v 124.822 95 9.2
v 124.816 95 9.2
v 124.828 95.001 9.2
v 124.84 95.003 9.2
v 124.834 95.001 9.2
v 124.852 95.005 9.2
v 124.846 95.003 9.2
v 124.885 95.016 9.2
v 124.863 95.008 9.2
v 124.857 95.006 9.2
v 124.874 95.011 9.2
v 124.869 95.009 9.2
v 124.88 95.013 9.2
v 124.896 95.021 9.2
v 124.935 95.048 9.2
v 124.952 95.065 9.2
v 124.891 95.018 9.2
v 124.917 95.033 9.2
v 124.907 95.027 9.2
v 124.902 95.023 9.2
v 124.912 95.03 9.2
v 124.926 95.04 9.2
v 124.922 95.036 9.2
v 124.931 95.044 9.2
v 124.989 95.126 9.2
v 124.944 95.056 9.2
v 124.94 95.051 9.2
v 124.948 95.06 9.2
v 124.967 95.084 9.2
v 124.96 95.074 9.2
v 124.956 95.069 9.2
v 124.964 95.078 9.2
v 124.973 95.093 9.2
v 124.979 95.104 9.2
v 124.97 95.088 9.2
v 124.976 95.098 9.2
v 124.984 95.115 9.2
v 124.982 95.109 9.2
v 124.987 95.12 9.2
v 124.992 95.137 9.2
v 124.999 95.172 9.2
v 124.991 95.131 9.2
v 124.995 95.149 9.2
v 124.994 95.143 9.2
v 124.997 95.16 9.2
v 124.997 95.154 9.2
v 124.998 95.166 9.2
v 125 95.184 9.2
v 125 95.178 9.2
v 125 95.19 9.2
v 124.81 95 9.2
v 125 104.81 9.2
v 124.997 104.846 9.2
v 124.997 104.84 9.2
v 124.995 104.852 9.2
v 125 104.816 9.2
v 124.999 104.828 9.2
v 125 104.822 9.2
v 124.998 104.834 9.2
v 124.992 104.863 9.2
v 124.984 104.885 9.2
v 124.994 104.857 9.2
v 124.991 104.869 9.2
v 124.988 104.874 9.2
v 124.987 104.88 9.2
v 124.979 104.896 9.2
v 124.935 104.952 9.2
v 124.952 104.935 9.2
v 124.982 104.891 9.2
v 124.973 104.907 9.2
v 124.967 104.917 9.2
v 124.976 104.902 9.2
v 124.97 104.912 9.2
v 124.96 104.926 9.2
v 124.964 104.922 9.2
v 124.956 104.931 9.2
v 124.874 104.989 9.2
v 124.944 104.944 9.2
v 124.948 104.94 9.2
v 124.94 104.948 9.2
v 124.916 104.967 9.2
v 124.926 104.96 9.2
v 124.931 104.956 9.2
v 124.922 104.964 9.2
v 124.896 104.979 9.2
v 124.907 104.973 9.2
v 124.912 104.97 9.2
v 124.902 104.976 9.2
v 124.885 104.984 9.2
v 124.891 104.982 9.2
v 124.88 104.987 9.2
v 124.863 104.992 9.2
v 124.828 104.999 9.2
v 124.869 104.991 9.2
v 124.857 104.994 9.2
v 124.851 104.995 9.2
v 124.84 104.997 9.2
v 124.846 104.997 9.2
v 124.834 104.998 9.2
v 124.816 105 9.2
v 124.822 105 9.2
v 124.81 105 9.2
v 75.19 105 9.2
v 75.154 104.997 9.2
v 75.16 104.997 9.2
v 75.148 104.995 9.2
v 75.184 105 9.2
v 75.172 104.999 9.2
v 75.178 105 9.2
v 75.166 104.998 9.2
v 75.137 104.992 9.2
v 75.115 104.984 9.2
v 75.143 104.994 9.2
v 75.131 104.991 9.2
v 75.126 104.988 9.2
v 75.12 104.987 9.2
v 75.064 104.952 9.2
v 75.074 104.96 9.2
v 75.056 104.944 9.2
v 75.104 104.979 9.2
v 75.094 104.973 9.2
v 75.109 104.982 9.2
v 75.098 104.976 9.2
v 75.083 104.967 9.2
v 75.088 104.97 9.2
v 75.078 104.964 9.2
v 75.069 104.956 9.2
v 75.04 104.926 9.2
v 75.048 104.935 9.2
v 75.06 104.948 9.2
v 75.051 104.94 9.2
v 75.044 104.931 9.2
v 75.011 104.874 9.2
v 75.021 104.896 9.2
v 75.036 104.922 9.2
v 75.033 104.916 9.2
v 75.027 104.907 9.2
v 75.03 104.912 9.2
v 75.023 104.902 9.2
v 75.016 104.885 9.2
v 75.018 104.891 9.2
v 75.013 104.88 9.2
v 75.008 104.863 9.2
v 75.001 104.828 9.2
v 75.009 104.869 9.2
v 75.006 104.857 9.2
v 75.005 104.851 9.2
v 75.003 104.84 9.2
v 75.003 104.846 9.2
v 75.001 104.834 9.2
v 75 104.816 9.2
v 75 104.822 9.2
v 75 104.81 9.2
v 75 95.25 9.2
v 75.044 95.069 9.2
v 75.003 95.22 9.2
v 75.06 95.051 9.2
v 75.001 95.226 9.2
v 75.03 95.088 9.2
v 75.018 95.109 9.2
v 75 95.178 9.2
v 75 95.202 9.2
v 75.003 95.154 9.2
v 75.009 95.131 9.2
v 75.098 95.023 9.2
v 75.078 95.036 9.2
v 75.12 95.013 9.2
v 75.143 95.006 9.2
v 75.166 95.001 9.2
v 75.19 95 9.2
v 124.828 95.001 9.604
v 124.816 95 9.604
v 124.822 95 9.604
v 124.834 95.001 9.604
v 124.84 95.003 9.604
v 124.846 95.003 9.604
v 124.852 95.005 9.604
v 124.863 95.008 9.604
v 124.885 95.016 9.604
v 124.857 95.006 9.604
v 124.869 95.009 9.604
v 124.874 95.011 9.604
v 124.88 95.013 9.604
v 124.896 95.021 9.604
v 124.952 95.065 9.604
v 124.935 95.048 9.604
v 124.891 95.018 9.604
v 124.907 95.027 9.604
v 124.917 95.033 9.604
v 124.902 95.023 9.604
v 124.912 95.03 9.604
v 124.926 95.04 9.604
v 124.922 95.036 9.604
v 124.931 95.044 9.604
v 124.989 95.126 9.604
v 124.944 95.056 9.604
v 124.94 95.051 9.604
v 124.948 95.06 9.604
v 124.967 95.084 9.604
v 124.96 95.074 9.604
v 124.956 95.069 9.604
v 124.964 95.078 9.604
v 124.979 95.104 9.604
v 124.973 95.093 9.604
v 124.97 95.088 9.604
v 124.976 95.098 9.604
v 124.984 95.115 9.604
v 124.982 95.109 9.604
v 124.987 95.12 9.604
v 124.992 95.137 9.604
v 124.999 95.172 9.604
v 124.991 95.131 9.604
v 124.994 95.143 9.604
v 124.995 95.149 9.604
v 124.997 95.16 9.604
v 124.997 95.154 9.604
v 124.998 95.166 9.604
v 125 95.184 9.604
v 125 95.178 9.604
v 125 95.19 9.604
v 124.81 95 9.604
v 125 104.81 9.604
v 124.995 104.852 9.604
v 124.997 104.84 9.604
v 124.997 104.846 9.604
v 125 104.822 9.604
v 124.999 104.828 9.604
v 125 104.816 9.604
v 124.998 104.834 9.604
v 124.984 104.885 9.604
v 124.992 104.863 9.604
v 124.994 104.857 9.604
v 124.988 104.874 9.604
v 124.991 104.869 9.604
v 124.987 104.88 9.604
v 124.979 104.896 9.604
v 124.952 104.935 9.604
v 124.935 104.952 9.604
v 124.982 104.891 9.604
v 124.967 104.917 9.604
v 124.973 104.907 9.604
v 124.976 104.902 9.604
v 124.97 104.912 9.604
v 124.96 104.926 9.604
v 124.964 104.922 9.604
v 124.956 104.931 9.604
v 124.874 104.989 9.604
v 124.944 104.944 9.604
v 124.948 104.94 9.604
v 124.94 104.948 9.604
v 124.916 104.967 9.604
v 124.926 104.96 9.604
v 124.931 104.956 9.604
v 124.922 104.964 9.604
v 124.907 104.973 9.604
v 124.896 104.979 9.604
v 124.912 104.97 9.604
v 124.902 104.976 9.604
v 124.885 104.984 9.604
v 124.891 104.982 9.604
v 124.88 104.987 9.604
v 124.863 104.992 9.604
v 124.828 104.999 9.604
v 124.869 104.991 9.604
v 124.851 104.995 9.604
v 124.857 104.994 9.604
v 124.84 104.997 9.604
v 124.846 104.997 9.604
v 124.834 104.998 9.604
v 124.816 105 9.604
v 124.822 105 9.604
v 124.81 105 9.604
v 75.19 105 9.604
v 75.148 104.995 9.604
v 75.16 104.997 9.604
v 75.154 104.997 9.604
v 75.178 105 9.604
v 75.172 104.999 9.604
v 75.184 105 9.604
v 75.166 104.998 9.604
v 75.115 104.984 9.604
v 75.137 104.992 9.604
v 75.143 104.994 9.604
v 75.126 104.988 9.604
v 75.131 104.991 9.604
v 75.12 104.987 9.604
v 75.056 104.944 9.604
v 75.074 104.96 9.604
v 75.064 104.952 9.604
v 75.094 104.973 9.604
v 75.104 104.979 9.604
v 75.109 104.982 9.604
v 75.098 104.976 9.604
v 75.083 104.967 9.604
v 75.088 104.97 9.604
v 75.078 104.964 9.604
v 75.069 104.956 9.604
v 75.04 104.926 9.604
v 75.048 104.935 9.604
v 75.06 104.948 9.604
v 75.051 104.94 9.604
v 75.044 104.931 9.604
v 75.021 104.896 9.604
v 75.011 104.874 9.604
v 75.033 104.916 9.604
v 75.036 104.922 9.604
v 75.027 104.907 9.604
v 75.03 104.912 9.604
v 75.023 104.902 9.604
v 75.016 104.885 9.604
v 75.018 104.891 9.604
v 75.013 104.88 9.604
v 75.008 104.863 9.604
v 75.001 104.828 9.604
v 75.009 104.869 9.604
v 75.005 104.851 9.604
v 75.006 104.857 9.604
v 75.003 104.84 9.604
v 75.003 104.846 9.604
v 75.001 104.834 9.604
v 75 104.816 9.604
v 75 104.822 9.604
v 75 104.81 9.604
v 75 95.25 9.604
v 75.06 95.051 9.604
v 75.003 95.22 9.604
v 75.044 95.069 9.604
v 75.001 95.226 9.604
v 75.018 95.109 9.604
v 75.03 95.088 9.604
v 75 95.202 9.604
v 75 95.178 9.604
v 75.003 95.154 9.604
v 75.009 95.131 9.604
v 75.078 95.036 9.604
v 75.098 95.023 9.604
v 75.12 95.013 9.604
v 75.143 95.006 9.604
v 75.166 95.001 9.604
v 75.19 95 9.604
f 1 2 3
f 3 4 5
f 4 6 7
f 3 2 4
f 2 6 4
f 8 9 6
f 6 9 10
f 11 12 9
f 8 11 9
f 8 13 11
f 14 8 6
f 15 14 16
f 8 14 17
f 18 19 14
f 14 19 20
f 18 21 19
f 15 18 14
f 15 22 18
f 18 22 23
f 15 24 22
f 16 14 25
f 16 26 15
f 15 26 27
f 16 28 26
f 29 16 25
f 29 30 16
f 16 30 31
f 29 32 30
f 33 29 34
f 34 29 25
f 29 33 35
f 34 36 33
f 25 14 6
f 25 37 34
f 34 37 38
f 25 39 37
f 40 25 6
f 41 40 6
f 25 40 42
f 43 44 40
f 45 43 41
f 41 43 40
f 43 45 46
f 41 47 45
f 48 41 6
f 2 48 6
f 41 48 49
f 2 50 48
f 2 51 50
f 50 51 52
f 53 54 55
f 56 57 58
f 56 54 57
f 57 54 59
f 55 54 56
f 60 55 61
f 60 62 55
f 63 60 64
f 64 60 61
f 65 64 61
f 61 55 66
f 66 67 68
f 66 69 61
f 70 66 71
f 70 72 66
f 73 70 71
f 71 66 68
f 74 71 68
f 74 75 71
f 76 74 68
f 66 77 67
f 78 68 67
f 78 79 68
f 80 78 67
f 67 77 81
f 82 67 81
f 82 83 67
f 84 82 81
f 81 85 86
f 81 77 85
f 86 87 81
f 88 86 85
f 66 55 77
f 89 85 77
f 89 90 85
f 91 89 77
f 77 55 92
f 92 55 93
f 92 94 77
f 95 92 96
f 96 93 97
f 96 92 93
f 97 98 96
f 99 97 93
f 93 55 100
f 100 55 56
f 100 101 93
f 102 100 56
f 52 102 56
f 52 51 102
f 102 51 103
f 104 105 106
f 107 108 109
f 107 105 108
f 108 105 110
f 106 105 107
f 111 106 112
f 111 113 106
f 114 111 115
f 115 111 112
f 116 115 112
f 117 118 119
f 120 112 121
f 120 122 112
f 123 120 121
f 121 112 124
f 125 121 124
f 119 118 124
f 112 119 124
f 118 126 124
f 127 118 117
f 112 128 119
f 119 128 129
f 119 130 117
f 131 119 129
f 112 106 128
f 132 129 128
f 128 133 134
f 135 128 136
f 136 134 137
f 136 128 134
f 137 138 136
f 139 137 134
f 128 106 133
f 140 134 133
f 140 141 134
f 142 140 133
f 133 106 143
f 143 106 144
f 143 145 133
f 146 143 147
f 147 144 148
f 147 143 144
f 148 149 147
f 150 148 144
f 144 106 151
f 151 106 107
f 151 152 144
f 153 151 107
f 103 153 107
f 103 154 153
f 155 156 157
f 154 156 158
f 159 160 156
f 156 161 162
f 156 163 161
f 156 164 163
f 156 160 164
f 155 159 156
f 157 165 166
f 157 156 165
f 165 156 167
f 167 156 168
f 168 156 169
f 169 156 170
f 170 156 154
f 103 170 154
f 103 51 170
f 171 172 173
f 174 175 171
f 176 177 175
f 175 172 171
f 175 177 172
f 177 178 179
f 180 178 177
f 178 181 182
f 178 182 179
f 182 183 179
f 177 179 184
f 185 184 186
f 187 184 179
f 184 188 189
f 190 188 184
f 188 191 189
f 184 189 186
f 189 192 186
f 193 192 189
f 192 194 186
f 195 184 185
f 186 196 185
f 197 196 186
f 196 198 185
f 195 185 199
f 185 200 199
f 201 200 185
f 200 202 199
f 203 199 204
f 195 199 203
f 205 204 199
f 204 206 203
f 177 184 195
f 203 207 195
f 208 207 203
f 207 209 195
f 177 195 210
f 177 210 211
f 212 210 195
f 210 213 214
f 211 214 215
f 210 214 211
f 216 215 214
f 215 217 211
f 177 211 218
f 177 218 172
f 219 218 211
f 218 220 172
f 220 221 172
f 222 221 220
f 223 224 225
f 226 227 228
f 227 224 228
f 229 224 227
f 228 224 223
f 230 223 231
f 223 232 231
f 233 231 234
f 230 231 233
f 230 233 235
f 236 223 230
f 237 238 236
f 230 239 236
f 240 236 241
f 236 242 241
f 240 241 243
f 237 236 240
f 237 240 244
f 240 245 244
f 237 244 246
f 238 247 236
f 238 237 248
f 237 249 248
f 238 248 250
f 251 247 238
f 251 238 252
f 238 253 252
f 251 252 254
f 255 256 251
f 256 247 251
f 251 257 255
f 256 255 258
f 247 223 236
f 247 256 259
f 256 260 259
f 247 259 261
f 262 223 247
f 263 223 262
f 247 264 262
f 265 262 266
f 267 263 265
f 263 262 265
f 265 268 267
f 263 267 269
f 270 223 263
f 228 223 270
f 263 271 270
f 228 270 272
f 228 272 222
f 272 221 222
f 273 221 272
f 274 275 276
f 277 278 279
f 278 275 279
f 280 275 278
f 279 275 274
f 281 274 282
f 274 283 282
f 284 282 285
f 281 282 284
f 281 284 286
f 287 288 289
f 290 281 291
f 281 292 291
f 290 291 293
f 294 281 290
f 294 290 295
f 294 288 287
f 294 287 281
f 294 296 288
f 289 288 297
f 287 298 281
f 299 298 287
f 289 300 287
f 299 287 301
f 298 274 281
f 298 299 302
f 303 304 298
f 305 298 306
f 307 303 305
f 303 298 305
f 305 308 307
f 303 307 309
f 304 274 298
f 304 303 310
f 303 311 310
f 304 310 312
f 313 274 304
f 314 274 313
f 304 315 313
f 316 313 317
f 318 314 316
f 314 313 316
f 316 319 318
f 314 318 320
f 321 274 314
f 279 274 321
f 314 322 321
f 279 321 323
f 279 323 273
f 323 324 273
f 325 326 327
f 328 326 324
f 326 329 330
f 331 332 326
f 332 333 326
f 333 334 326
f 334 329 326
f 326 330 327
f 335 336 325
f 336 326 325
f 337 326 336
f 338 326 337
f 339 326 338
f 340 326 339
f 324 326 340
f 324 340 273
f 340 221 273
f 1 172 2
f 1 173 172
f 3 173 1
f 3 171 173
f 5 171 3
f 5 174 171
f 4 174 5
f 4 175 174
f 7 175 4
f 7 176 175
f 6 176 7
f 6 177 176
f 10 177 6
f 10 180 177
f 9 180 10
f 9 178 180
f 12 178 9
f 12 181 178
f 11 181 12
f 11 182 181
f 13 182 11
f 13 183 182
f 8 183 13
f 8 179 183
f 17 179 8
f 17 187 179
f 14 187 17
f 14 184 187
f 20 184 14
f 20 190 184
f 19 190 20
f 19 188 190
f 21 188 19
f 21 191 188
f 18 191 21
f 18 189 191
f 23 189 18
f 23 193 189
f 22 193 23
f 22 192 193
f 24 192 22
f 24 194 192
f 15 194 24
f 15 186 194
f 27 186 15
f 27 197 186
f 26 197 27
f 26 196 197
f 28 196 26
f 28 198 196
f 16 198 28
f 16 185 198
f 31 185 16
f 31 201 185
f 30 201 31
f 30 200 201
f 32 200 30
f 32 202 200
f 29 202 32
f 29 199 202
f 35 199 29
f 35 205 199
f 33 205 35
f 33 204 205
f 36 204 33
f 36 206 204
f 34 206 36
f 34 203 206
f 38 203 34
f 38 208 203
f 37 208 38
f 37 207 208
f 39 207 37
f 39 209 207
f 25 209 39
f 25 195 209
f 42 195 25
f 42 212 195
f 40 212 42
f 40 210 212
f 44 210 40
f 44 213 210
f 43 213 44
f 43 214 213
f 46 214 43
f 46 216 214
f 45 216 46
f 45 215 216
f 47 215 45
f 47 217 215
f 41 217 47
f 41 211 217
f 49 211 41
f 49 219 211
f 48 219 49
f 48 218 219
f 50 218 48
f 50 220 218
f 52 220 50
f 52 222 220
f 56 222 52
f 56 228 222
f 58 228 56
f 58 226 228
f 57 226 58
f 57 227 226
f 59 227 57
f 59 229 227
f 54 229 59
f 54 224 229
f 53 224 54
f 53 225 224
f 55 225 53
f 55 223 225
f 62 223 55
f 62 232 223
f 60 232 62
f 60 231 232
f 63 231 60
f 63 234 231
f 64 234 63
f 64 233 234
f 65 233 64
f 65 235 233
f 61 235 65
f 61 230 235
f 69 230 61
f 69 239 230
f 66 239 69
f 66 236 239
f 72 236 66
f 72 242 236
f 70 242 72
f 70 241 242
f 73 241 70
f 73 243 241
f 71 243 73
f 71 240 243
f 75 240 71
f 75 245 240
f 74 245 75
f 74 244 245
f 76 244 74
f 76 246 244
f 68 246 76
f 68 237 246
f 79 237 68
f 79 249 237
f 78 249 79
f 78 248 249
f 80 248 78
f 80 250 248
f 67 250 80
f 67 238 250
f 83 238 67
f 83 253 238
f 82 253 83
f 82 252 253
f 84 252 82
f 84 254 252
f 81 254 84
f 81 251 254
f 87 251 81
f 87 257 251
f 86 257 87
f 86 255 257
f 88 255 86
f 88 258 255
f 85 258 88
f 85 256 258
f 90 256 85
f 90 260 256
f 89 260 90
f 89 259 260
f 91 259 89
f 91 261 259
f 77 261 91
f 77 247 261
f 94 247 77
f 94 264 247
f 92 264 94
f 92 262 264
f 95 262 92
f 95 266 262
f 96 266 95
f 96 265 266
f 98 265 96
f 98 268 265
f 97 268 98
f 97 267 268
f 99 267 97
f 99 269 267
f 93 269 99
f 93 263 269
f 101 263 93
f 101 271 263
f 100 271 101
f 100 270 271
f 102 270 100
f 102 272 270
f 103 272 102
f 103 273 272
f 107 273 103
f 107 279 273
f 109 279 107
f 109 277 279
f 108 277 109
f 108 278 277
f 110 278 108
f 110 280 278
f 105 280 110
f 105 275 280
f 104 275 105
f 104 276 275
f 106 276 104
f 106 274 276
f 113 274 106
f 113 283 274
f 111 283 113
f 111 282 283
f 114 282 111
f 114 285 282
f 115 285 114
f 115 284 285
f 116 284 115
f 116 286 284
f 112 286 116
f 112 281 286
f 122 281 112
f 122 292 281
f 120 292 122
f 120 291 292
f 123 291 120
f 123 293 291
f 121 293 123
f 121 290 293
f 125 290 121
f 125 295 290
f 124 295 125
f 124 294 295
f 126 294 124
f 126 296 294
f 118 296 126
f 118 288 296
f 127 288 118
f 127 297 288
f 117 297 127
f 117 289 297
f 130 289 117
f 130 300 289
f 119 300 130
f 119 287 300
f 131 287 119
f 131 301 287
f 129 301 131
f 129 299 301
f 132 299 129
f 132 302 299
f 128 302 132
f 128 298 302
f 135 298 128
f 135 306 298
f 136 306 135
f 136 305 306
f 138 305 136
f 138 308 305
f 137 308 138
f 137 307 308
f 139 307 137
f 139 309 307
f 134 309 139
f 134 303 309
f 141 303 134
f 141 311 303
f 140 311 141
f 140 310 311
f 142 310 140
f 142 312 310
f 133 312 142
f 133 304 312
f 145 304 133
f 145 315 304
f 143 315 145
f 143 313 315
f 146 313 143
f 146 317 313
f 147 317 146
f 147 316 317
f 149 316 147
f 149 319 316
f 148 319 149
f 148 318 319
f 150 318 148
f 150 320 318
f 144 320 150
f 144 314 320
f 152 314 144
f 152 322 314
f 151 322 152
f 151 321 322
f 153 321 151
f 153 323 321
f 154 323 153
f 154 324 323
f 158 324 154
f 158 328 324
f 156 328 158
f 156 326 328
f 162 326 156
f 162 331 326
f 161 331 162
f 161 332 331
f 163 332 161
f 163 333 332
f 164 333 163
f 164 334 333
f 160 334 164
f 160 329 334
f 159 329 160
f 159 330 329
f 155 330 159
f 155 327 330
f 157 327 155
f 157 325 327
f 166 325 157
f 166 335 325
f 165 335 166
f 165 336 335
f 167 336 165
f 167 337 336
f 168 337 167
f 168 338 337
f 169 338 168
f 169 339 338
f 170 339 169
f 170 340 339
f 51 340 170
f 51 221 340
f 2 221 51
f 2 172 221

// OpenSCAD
module drawBasicShape(x1, y1, x2, y2, width)
{
	length = sqrt((x1-x2)*(x1-x2) + (y1-y2)*(y1-y2));
	if (width!=0.0) {
		square(size = [width, length], center = false);
		translate([width/2.0, 0, 0]) circle(d=width);
		translate([width/2.0, length, 0]) circle(d=width);
	}
}

module translateAndRotate(x1, y1, x2, y2, width)
{
	if (width != 0.0) {
		angle = atan((y2-y1)/(x2-x1)) +270;
		if (x2>=x1) {
			translate([x1, y1, 0.0]) rotate([0.0, 0.0, angle]) translate([-width/2.0, 0.0, 0.0]) scale([1.0, 1.0, 1.0]) drawBasicShape(x1, y1, x2, y2, width);
		}
		else {
			translate([x1, y1, 0.0]) rotate([0.0, 0.0, angle+180]) translate([-width/2.0, 0.0, 0.0]) scale([1.0, 1.0, 1.0]) drawBasicShape(x1, y1, x2, y2, width);		}
	}
}

$fn=50;

points22 = [
[75.77800000, 95.77800000, 0.00000000],
[124.22200000, 95.77800000, 0.37999672],
[124.22200000, 104.22200000, 0.37997788],
[75.77800000, 104.22200000, 0.37999548],
[75.77800000, 95.83800000, 0.37998140],
[75.48400000, 95.48400000, 0.00000000],
[124.51600000, 95.48400000, 0.37999746],
[124.51600000, 104.51600000, 0.37998977],
[75.48400000, 104.51600000, 0.37999868],
[75.48400000, 95.54400000, 0.37998644],
[75.19000000, 95.19000000, 0.00000000],
[124.81000000, 95.19000000, 0.38000060],
[124.81000000, 104.81000000, 0.38000021],
[75.19000000, 104.81000000, 0.37999939],
[75.19000000, 95.25000000, 0.38000344],
[75.53600000, 95.39000000, 0.00000000],
[75.94600000, 103.88900000, 0.00000000],
[76.11100000, 104.05400000, 0.37961375],
[76.52800000, 104.05400000, 0.38001190],
[75.94600000, 103.47200000, 0.37989934],
[75.94600000, 103.05500000, 0.38001190],
[76.94500000, 104.05400000, 0.37998907],
[77.36200000, 104.05400000, 0.38001190],
[75.94600000, 102.63800000, 0.37999592],
[75.94600000, 102.22100000, 0.38001190],
[77.77900000, 104.05400000, 0.37999966],
[78.19600000, 104.05400000, 0.38001190],
[75.94600000, 101.80400000, 0.38002091],
[75.94600000, 101.38700000, 0.38001190],
[78.61300000, 104.05400000, 0.38001957],
[79.03000000, 104.05400000, 0.38001190],
[75.94600000, 100.97000000, 0.38001859],
[75.94600000, 100.55300000, 0.38001190],
[79.44700000, 104.05400000, 0.38001785],
[79.86400000, 104.05400000, 0.38015610],
[75.94600000, 100.13600000, 0.38001726],
[75.94600000, 99.71900000, 0.38015610],
[80.28100000, 104.05400000, 0.38002660],
[80.69800000, 104.05400000, 0.38001190],
[75.94600000, 99.30200000, 0.38002534],
[75.94600000, 98.88500000, 0.38001190],
[81.11500000, 104.05400000, 0.38003252],
[81.53300000, 104.05400000, 0.37930814],
[75.94600000, 98.46700000, 0.37997836],
[75.94600000, 98.05000000, 0.38015610],
[81.95000000, 104.05400000, 0.37998072],
[82.36700000, 104.05400000, 0.38001190],
[75.94600000, 97.63300000, 0.37998939],
[75.94600000, 97.21600000, 0.38001190],
[82.78400000, 104.05400000, 0.37999079],
[83.20100000, 104.05400000, 0.38001190],
[75.94600000, 96.79900000, 0.37999789],
[75.94600000, 96.38200000, 0.38001190],
[83.61800000, 104.05400000, 0.37999868],
[84.03500000, 104.05400000, 0.38001190],
[75.95600000, 95.97600000, 0.38000275],
[76.34400000, 95.94600000, 0.37958004],
[84.45200000, 104.05400000, 0.38000229],
[84.86900000, 104.05400000, 0.38001190],
[76.76100000, 95.94600000, 0.38000754],
[77.17800000, 95.94600000, 0.38001190],
[85.28600000, 104.05400000, 0.38000229],
[85.70300000, 104.05400000, 0.38015610],
[77.59500000, 95.94600000, 0.38000229],
[78.01200000, 95.94600000, 0.38001190],
[86.12000000, 104.05400000, 0.38000754],
[86.53700000, 104.05400000, 0.38001190],
[78.42900000, 95.94600000, 0.38000229],
[78.84600000, 95.94600000, 0.38001190],
[86.95400000, 104.05400000, 0.38000754],
[87.37100000, 104.05400000, 0.38001190],
[79.26300000, 95.94600000, 0.38000229],
[79.68000000, 95.94600000, 0.38015610],
[87.78900000, 104.05400000, 0.37998415],
[88.20600000, 104.05400000, 0.38001190],
[80.09700000, 95.94600000, 0.37998940],
[80.51500000, 95.94600000, 0.37930814],
[88.62300000, 104.05400000, 0.38000229],
[89.04000000, 104.05400000, 0.38001190],
[80.93200000, 95.94600000, 0.38000754],
[81.34900000, 95.94600000, 0.38001190],
[89.45700000, 104.05400000, 0.38000229],
[89.87400000, 104.05400000, 0.38015610],
[81.76600000, 95.94600000, 0.38000229],
[82.18300000, 95.94600000, 0.38001190],
[90.29100000, 104.05400000, 0.38000754],
[90.70800000, 104.05400000, 0.38001190],
[82.60000000, 95.94600000, 0.38000229],
[83.01700000, 95.94600000, 0.38001190],
[91.12500000, 104.05400000, 0.38000754],
[91.54200000, 104.05400000, 0.38001190],
[83.43400000, 95.94600000, 0.38000229],
[83.85100000, 95.94600000, 0.38015610],
[91.95900000, 104.05400000, 0.38000229],
[92.37600000, 104.05400000, 0.38001190],
[84.26800000, 95.94600000, 0.38000229],
[84.68500000, 95.94600000, 0.38015610],
[92.79300000, 104.05400000, 0.38000229],
[93.21000000, 104.05400000, 0.38001190],
[85.10200000, 95.94600000, 0.38000754],
[85.51900000, 95.94600000, 0.38001190],
[93.62700000, 104.05400000, 0.38000229],
[94.04400000, 104.05400000, 0.38015610],
[85.93600000, 95.94600000, 0.38000229],
[86.35300000, 95.94600000, 0.38001190],
[94.46200000, 104.05400000, 0.37998415],
[94.87900000, 104.05400000, 0.38015610],
[86.77000000, 95.94600000, 0.37998415],
[87.18800000, 95.94600000, 0.37930814],
[95.29600000, 104.05400000, 0.38000754],
[95.71300000, 104.05400000, 0.38001190],
[87.60500000, 95.94600000, 0.38000229],
[88.02200000, 95.94600000, 0.38001190],
[96.13000000, 104.05400000, 0.38000754],
[96.54700000, 104.05400000, 0.38001190],
[88.43900000, 95.94600000, 0.38000229],
[88.85600000, 95.94600000, 0.38015610],
[96.96400000, 104.05400000, 0.38000229],
[97.38100000, 104.05400000, 0.38001190],
[89.27300000, 95.94600000, 0.38000754],
[89.69000000, 95.94600000, 0.38001190],
[97.79800000, 104.05400000, 0.38000229],
[98.21500000, 104.05400000, 0.38015610],
[90.10700000, 95.94600000, 0.38000229],
[90.52400000, 95.94600000, 0.38001190],
[98.63200000, 104.05400000, 0.38000229],
[99.04900000, 104.05400000, 0.38015610],
[90.94100000, 95.94600000, 0.38000229],
[91.35800000, 95.94600000, 0.38001190],
[99.46600000, 104.05400000, 0.38000754],
[99.88300000, 104.05400000, 0.38001190],
[91.77500000, 95.94600000, 0.38000229],
[92.19200000, 95.94600000, 0.38001190],
[100.30000000, 104.05400000, 0.38000754],
[100.71800000, 104.05400000, 0.37930814],
[92.60900000, 95.94600000, 0.37998415],
[93.02600000, 95.94600000, 0.38015610],
[101.13500000, 104.05400000, 0.37998415],
[101.55200000, 104.05400000, 0.38001190],
[93.44400000, 95.94600000, 0.38000754],
[93.86100000, 95.94600000, 0.38001190],
[101.96900000, 104.05400000, 0.38000229],
[102.38600000, 104.05400000, 0.38001190],
[94.27800000, 95.94600000, 0.38000754],
[94.69500000, 95.94600000, 0.38001190],
[102.80300000, 104.05400000, 0.38000229],
[103.22000000, 104.05400000, 0.38015610],
[95.11200000, 95.94600000, 0.38000229],
[95.52900000, 95.94600000, 0.38001190],
[103.63700000, 104.05400000, 0.38000754],
[104.05400000, 104.05400000, 0.38001190],
[95.94600000, 95.94600000, 0.38000229],
[96.36300000, 95.94600000, 0.38001190],
[104.47100000, 104.05400000, 0.38000754],
[104.88800000, 104.05400000, 0.38001190],
[96.78000000, 95.94600000, 0.38000229],
[97.19700000, 95.94600000, 0.38015610],
[105.30500000, 104.05400000, 0.38000229],
[105.72200000, 104.05400000, 0.38001190],
[97.61400000, 95.94600000, 0.38000754],
[98.03100000, 95.94600000, 0.38001190],
[106.13900000, 104.05400000, 0.38000229],
[106.55600000, 104.05400000, 0.38001190],
[98.44800000, 95.94600000, 0.38000754],
[98.86500000, 95.94600000, 0.38001190],
[106.97300000, 104.05400000, 0.38000229],
[107.39100000, 104.05400000, 0.37945200],
[99.28200000, 95.94600000, 0.37998415],
[99.69900000, 95.94600000, 0.38001190],
[107.80800000, 104.05400000, 0.37998415],
[108.22500000, 104.05400000, 0.38015610],
[100.11700000, 95.94600000, 0.38000229],
[100.53400000, 95.94600000, 0.38001190],
[108.64200000, 104.05400000, 0.38000754],
[109.05900000, 104.05400000, 0.38001190],
[100.95100000, 95.94600000, 0.38000229],
[101.36800000, 95.94600000, 0.38015610],
[109.47600000, 104.05400000, 0.38000229],
[109.89300000, 104.05400000, 0.38001190],
[101.78500000, 95.94600000, 0.38000229],
[102.20200000, 95.94600000, 0.38015610],
[110.31000000, 104.05400000, 0.38000229],
[110.72700000, 104.05400000, 0.38001190],
[102.61900000, 95.94600000, 0.38000754],
[103.03600000, 95.94600000, 0.38001190],
[111.14400000, 104.05400000, 0.38000229],
[111.56100000, 104.05400000, 0.38001190],
[103.45300000, 95.94600000, 0.38000754],
[103.87000000, 95.94600000, 0.38001190],
[111.97800000, 104.05400000, 0.38000229],
[112.39500000, 104.05400000, 0.38015610],
[104.28700000, 95.94600000, 0.38000229],
[104.70400000, 95.94600000, 0.38001190],
[112.81200000, 104.05400000, 0.38000754],
[113.22900000, 104.05400000, 0.38001190],
[105.12100000, 95.94600000, 0.38000229],
[105.53800000, 95.94600000, 0.38001190],
[113.64700000, 104.05400000, 0.37998940],
[114.06400000, 104.05400000, 0.38001190],
[105.95500000, 95.94600000, 0.37998415],
[106.37300000, 95.94600000, 0.37945200],
[114.48100000, 104.05400000, 0.38000229],
[114.89800000, 104.05400000, 0.38001190],
[106.79000000, 95.94600000, 0.38000754],
[107.20700000, 95.94600000, 0.38001190],
[115.31500000, 104.05400000, 0.38000229],
[115.73200000, 104.05400000, 0.38001190],
[107.62400000, 95.94600000, 0.38000754],
[108.04100000, 95.94600000, 0.38001190],
[116.14900000, 104.05400000, 0.38000229],
[116.56600000, 104.05400000, 0.38015610],
[108.45800000, 95.94600000, 0.38000229],
[108.87500000, 95.94600000, 0.38001190],
[116.98300000, 104.05400000, 0.38000754],
[117.40000000, 104.05400000, 0.38001190],
[109.29200000, 95.94600000, 0.38000229],
[109.70900000, 95.94600000, 0.38001190],
[117.81700000, 104.05400000, 0.38000754],
[118.23400000, 104.05400000, 0.38001190],
[110.12600000, 95.94600000, 0.38000229],
[110.54300000, 95.94600000, 0.38015610],
[118.65100000, 104.05400000, 0.38000229],
[119.06800000, 104.05400000, 0.38001190],
[110.96000000, 95.94600000, 0.38000754],
[111.37700000, 95.94600000, 0.38001190],
[119.48500000, 104.05400000, 0.38000229],
[119.90200000, 104.05400000, 0.38001190],
[111.79400000, 95.94600000, 0.38000754],
[112.21100000, 95.94600000, 0.38001190],
[120.32000000, 104.05400000, 0.37998415],
[120.73700000, 104.05400000, 0.38015610],
[112.62900000, 95.94600000, 0.38000229],
[113.04600000, 95.94600000, 0.38001190],
[121.15400000, 104.05400000, 0.38000229],
[121.57100000, 104.05400000, 0.38015610],
[113.46300000, 95.94600000, 0.38000229],
[113.88000000, 95.94600000, 0.38001190],
[121.98800000, 104.05400000, 0.38000754],
[122.40500000, 104.05400000, 0.38001190],
[114.29700000, 95.94600000, 0.38000229],
[114.71400000, 95.94600000, 0.38001190],
[122.82200000, 104.05400000, 0.38000754],
[123.23900000, 104.05400000, 0.38001190],
[115.13100000, 95.94600000, 0.38000229],
[115.54800000, 95.94600000, 0.38015610],
[123.65600000, 104.05400000, 0.38000229],
[124.04400000, 104.02500000, 0.37963728],
[115.96500000, 95.94600000, 0.37998455],
[116.38200000, 95.94600000, 0.38001190],
[124.05400000, 103.61800000, 0.37999868],
[124.05400000, 103.20100000, 0.38015610],
[116.79900000, 95.94600000, 0.37999203],
[117.21600000, 95.94600000, 0.38015610],
[124.05400000, 102.78400000, 0.37999079],
[124.05400000, 102.36700000, 0.38001190],
[117.63300000, 95.94600000, 0.37998939],
[118.05000000, 95.94600000, 0.38001190],
[124.05400000, 101.95000000, 0.37998780],
[124.05400000, 101.53300000, 0.38001190],
[118.46700000, 95.94600000, 0.37998597],
[118.88400000, 95.94600000, 0.38001190],
[124.05400000, 101.11600000, 0.37997562],
[124.05400000, 100.69800000, 0.37930814],
[119.30200000, 95.94600000, 0.38003429],
[119.71900000, 95.94600000, 0.38001190],
[124.05400000, 100.28100000, 0.38003640],
[124.05400000, 99.86400000, 0.38001190],
[120.13600000, 95.94600000, 0.38002811],
[120.55300000, 95.94600000, 0.38001190],
[124.05400000, 99.44700000, 0.38002999],
[124.05400000, 99.03000000, 0.38001190],
[120.97000000, 95.94600000, 0.38003238],
[121.38700000, 95.94600000, 0.38001190],
[124.05400000, 98.61300000, 0.38001957],
[124.05400000, 98.19600000, 0.38001190],
[121.80400000, 95.94600000, 0.38002091],
[122.22100000, 95.94600000, 0.38001190],
[124.05400000, 97.77900000, 0.38002285],
[124.05400000, 97.36200000, 0.38001190],
[122.63800000, 95.94600000, 0.37999592],
[123.05500000, 95.94600000, 0.38001190],
[124.05400000, 96.94500000, 0.37998907],
[124.05400000, 96.52800000, 0.38001190],
[123.47200000, 95.94600000, 0.37997240],
[123.88900000, 95.94600000, 0.38001190],
[124.05400000, 96.11100000, 0.37961375],
];

translate([0.0, 0.0, 9.20000000]) {
	linear_extrude(height = 0.40400000, center = false, convexity = 10, twist = 0) {
		union() {
			for( i=[0:len(points22)-2] ){ 
				x1 = points22[i][0];
				y1 = points22[i][1];
				x2 = points22[i+1][0];
				y2 = points22[i+1][1];
				width = points22[i+1][2];
				translateAndRotate(x1, y1, x2, y2, width);
			}
		}
	}
}
